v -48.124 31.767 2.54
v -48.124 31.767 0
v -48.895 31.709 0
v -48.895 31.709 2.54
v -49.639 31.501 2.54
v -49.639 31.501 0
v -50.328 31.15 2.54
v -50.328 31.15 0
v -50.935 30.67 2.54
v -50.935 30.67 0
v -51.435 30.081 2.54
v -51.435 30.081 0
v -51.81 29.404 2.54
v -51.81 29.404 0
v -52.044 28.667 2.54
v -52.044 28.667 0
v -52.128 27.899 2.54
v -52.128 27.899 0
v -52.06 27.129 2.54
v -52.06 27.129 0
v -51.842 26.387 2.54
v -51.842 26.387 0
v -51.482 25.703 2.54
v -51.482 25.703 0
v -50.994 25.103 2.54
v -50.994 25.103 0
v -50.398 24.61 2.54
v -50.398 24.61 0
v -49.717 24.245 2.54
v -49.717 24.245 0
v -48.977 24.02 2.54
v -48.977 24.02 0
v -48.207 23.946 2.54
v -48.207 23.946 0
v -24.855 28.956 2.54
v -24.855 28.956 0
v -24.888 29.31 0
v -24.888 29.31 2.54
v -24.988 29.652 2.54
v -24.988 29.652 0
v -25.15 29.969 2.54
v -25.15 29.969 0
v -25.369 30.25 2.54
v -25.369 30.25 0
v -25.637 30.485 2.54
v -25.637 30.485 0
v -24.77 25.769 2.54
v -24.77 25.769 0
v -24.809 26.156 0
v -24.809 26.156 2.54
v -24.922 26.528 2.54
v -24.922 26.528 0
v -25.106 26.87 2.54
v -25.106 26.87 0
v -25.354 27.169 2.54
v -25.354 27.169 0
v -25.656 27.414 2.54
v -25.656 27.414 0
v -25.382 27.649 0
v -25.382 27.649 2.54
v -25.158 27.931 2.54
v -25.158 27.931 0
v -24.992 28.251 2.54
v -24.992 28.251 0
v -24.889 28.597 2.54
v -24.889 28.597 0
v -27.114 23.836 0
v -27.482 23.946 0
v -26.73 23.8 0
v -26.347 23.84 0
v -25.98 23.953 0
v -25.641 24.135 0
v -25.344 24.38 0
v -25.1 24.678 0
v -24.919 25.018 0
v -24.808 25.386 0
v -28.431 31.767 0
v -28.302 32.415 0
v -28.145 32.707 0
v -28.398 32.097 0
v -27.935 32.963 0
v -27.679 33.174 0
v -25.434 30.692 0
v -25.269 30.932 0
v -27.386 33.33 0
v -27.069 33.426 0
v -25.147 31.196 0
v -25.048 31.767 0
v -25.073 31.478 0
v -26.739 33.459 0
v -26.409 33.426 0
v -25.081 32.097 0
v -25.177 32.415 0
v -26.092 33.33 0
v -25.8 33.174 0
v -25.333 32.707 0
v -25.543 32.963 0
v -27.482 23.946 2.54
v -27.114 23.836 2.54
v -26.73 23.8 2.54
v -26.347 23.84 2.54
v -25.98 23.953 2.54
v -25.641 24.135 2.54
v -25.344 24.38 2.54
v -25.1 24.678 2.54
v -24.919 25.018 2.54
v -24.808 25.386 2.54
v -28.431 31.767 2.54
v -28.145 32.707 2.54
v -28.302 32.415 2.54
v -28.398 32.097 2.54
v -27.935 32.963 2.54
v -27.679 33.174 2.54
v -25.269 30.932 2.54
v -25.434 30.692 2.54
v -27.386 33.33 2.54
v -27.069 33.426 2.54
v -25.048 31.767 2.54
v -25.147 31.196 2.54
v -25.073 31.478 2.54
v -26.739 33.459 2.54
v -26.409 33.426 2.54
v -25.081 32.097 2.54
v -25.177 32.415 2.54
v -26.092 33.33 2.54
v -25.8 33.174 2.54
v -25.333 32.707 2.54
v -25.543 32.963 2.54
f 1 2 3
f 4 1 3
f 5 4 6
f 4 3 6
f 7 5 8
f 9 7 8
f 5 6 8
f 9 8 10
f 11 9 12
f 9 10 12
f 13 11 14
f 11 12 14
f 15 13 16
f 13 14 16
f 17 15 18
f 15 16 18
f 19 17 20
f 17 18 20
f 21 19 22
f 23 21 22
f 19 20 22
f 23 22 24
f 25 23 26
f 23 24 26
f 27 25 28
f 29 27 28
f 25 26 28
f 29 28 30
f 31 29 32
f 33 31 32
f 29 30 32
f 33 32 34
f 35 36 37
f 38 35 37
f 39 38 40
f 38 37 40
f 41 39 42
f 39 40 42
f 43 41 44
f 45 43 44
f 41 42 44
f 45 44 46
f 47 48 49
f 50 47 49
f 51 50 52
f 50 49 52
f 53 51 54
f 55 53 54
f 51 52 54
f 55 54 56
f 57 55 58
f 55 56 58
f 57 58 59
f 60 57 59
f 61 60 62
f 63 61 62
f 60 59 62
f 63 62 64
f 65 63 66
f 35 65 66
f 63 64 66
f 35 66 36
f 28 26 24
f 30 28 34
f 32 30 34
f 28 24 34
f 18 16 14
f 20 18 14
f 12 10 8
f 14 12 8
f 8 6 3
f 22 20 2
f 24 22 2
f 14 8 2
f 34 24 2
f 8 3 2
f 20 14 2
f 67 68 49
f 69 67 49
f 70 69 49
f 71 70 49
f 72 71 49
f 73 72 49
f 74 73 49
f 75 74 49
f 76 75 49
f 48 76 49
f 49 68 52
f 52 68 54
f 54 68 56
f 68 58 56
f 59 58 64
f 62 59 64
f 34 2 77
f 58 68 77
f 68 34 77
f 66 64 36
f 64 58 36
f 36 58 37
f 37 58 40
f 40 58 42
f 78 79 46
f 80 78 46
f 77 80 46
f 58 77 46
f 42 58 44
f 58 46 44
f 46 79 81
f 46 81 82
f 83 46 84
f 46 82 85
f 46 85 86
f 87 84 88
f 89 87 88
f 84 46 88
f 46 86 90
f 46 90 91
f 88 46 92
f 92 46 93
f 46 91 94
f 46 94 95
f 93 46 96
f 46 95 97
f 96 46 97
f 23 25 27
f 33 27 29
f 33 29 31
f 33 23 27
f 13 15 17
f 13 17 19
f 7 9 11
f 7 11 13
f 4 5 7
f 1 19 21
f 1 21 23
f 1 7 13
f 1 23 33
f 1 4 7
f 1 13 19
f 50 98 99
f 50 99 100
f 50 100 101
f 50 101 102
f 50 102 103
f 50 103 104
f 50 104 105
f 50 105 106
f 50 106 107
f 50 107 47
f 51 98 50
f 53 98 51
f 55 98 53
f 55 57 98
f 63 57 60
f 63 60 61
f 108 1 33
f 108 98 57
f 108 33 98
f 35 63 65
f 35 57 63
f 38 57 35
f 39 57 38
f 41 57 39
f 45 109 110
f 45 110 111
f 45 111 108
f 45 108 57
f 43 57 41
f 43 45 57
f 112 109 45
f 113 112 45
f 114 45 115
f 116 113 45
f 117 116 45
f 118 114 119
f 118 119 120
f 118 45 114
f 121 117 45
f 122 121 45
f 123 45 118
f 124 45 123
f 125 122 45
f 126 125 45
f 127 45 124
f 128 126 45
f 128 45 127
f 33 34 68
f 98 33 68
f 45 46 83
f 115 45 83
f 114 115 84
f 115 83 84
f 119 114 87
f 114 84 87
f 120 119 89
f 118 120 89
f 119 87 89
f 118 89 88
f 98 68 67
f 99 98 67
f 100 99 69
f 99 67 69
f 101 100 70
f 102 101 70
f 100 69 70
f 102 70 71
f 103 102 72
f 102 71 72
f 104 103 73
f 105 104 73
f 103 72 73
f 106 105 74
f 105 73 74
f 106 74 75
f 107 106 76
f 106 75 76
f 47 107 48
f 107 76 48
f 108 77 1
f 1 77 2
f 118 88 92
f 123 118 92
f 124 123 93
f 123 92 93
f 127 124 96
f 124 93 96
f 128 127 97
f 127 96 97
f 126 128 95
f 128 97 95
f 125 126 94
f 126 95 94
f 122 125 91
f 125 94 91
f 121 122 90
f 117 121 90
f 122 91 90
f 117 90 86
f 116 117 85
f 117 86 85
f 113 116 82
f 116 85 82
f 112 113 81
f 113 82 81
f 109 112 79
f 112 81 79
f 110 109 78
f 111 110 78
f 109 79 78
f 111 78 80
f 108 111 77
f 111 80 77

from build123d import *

# Parameters (mm, degrees)
F1_DEPTH = 2.54


with BuildPart() as f1:
    # F0 (on Top) → F1 (new body)
    with BuildSketch(Plane.XY):
        with BuildLine():
            ThreePointArc((-48.2069574252, 23.9459875329), (-45.4479490063, 25.0952354669), (-44.306015985, 27.8572795006))
            ThreePointArc((-44.306015985, 27.8572795006), (-45.4187538691, 30.5897381841), (-48.123835931, 31.7674678193))
            ThreePointArc((-48.123835931, 31.7674678193), (-52.1284065306, 27.8988439109), (-48.2069574252, 23.9459875329))
        make_face()
        with BuildLine():
            ThreePointArc((-48.123835931, 31.7674678193), (-45.4187538691, 30.5897381841), (-44.306015985, 27.8572795006))
            ThreePointArc((-44.306015985, 27.8572795006), (-45.4479490063, 25.0952354669), (-48.2069574252, 23.9459875329))
            Line((-48.2069574252, 23.9459875329), (-27.4824430727, 23.9459875329))
            ThreePointArc((-27.4824430727, 23.9459875329), (-28.698975557, 25.5773806564), (-27.8223428434, 27.4139290206))
            ThreePointArc((-27.8223428434, 27.4139290206), (-28.6236525625, 28.9443668487), (-27.8413020228, 30.4845826922))
            ThreePointArc((-27.8413020228, 30.4845826922), (-28.276159726, 31.0616081435), (-28.4305025642, 31.7674678193))
            Line((-28.4305025642, 31.7674678193), (-48.123835931, 31.7674678193))
        make_face()
        with BuildLine():
            ThreePointArc((-25.048035327, 31.7674678193), (-26.7392689456, 33.4587014379), (-28.4305025642, 31.7674678193))
            ThreePointArc((-28.4305025642, 31.7674678193), (-28.276159726, 31.0616081435), (-27.8413020228, 30.4845826922))
            ThreePointArc((-27.8413020228, 30.4845826922), (-26.7392689456, 30.8404211594), (-25.6372358685, 30.4845826922))
            ThreePointArc((-25.6372358685, 30.4845826922), (-25.2023781652, 31.0616081435), (-25.048035327, 31.7674678193))
        make_face()
        with BuildLine():
            ThreePointArc((-27.8223428434, 27.4139290206), (-28.698975557, 25.5773806564), (-27.4824430727, 23.9459875329))
            ThreePointArc((-27.4824430727, 23.9459875329), (-25.6406423469, 24.1353310392), (-24.7701720222, 25.7694553584))
            ThreePointArc((-24.7701720222, 25.7694553584), (-25.0057724539, 26.7034428352), (-25.6561950478, 27.4139290206))
            ThreePointArc((-25.6561950478, 27.4139290206), (-26.7392689456, 27.0715820895), (-27.8223428434, 27.4139290206))
        make_face()
        with BuildLine():
            ThreePointArc((-25.6372358685, 30.4845826922), (-26.7392689456, 30.8404211594), (-27.8413020228, 30.4845826922))
            ThreePointArc((-27.8413020228, 30.4845826922), (-26.7392689456, 30.0762342007), (-25.6372358685, 30.4845826922))
        make_face()
        with BuildLine():
            ThreePointArc((-25.6372358685, 30.4845826922), (-26.7392689456, 30.0762342007), (-27.8413020228, 30.4845826922))
            ThreePointArc((-27.8413020228, 30.4845826922), (-28.6236525625, 28.9443668487), (-27.8223428434, 27.4139290206))
            ThreePointArc((-27.8223428434, 27.4139290206), (-26.7392689456, 27.7385522818), (-25.6561950478, 27.4139290206))
            ThreePointArc((-25.6561950478, 27.4139290206), (-25.0671441604, 28.0870737296), (-24.8548494107, 28.9560016245))
            ThreePointArc((-24.8548494107, 28.9560016245), (-25.0618111008, 29.8145889307), (-25.6372358685, 30.4845826922))
        make_face()
        with BuildLine():
            ThreePointArc((-25.6561950478, 27.4139290206), (-26.7392689456, 27.7385522818), (-27.8223428434, 27.4139290206))
            ThreePointArc((-27.8223428434, 27.4139290206), (-26.7392689456, 27.0715820895), (-25.6561950478, 27.4139290206))
        make_face()
    extrude(amount=F1_DEPTH)


solid = f1.part
